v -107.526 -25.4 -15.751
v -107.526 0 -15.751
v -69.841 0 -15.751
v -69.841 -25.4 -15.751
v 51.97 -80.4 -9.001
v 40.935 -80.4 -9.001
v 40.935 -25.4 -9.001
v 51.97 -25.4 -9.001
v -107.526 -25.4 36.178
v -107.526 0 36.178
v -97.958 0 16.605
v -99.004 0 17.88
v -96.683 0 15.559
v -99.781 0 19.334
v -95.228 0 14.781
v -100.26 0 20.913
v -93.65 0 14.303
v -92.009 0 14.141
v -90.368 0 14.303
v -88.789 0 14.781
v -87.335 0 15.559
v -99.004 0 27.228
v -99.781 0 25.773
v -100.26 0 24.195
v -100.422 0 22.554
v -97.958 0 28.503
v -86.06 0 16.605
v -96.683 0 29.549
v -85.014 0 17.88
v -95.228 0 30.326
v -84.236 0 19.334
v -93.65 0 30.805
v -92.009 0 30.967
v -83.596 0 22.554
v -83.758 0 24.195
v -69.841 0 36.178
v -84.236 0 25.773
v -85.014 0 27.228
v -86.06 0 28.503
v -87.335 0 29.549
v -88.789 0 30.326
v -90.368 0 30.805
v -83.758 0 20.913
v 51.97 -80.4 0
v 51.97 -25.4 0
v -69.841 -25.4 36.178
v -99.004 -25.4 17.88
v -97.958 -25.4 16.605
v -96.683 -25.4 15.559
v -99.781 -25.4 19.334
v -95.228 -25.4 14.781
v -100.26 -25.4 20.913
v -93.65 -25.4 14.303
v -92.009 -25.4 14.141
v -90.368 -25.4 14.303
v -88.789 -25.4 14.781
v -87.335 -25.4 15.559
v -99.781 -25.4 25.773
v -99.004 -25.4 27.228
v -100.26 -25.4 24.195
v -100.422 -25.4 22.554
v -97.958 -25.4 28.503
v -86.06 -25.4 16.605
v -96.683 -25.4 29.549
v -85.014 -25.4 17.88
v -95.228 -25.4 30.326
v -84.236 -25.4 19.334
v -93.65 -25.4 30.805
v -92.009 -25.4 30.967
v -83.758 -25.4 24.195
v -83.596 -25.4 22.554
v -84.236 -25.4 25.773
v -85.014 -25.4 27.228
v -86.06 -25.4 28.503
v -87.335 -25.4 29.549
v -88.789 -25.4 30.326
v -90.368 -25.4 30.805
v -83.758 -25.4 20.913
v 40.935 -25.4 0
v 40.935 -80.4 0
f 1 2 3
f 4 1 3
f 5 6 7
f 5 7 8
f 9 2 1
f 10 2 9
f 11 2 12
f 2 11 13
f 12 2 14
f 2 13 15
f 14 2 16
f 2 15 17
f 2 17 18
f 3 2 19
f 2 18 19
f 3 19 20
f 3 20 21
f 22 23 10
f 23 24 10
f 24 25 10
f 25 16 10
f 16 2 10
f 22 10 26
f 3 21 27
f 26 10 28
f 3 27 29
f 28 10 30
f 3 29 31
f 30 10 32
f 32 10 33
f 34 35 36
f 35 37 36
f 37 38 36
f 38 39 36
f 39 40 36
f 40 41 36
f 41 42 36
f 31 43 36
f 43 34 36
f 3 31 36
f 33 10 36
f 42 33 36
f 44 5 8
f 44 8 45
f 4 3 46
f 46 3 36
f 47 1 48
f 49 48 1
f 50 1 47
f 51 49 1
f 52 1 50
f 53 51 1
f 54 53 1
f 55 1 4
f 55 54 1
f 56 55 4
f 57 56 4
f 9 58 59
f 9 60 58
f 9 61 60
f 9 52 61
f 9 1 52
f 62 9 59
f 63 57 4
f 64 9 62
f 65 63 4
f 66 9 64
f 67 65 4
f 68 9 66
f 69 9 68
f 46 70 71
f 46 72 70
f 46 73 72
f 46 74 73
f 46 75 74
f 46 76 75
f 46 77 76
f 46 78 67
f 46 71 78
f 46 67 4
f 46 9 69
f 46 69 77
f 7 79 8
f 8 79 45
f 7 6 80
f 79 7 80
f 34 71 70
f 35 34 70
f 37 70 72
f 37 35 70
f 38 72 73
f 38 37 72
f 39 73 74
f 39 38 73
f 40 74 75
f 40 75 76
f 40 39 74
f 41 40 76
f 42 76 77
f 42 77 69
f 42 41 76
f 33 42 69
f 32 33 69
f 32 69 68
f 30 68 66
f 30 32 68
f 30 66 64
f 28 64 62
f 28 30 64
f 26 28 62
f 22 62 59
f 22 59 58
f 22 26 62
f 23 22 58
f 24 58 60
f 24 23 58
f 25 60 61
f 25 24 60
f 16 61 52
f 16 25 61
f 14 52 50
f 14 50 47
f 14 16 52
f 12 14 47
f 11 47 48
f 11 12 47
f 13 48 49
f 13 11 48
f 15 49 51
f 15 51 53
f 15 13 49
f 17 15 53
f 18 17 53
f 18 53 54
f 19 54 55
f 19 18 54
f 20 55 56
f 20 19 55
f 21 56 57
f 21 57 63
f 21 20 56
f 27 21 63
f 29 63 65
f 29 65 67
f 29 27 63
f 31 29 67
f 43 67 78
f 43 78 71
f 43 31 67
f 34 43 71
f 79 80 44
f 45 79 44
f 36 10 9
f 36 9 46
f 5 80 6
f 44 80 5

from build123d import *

# Parameters (mm, degrees)
F0_W     = 37.684418
F0_H     = 51.928796
F0_R     = 8.412793
F1_DEPTH = 25.4
F4_W     = 11.035368
F4_H     = 9.000774
F2_DEPTH = 55


with BuildPart() as f1:
    # F0 (on Front) → F1 (new body)
    with BuildSketch(Plane.XZ):
        with Locations((-88.683676, 10.213293)):
            Rectangle(F0_W, F0_H)
        with Locations((-92.00877, 22.553813)):
            Circle(F0_R, mode=Mode.SUBTRACT)
    extrude(amount=F1_DEPTH)


with BuildPart() as f2:
    # F4 (on face) → F2 (new body)
    with BuildSketch(Plane.XZ.offset(25.4)):
        with Locations((46.452332, -4.500387)):
            Rectangle(F4_W, F4_H)
    extrude(amount=F2_DEPTH)


solid = Compound([f1.part, f2.part])
